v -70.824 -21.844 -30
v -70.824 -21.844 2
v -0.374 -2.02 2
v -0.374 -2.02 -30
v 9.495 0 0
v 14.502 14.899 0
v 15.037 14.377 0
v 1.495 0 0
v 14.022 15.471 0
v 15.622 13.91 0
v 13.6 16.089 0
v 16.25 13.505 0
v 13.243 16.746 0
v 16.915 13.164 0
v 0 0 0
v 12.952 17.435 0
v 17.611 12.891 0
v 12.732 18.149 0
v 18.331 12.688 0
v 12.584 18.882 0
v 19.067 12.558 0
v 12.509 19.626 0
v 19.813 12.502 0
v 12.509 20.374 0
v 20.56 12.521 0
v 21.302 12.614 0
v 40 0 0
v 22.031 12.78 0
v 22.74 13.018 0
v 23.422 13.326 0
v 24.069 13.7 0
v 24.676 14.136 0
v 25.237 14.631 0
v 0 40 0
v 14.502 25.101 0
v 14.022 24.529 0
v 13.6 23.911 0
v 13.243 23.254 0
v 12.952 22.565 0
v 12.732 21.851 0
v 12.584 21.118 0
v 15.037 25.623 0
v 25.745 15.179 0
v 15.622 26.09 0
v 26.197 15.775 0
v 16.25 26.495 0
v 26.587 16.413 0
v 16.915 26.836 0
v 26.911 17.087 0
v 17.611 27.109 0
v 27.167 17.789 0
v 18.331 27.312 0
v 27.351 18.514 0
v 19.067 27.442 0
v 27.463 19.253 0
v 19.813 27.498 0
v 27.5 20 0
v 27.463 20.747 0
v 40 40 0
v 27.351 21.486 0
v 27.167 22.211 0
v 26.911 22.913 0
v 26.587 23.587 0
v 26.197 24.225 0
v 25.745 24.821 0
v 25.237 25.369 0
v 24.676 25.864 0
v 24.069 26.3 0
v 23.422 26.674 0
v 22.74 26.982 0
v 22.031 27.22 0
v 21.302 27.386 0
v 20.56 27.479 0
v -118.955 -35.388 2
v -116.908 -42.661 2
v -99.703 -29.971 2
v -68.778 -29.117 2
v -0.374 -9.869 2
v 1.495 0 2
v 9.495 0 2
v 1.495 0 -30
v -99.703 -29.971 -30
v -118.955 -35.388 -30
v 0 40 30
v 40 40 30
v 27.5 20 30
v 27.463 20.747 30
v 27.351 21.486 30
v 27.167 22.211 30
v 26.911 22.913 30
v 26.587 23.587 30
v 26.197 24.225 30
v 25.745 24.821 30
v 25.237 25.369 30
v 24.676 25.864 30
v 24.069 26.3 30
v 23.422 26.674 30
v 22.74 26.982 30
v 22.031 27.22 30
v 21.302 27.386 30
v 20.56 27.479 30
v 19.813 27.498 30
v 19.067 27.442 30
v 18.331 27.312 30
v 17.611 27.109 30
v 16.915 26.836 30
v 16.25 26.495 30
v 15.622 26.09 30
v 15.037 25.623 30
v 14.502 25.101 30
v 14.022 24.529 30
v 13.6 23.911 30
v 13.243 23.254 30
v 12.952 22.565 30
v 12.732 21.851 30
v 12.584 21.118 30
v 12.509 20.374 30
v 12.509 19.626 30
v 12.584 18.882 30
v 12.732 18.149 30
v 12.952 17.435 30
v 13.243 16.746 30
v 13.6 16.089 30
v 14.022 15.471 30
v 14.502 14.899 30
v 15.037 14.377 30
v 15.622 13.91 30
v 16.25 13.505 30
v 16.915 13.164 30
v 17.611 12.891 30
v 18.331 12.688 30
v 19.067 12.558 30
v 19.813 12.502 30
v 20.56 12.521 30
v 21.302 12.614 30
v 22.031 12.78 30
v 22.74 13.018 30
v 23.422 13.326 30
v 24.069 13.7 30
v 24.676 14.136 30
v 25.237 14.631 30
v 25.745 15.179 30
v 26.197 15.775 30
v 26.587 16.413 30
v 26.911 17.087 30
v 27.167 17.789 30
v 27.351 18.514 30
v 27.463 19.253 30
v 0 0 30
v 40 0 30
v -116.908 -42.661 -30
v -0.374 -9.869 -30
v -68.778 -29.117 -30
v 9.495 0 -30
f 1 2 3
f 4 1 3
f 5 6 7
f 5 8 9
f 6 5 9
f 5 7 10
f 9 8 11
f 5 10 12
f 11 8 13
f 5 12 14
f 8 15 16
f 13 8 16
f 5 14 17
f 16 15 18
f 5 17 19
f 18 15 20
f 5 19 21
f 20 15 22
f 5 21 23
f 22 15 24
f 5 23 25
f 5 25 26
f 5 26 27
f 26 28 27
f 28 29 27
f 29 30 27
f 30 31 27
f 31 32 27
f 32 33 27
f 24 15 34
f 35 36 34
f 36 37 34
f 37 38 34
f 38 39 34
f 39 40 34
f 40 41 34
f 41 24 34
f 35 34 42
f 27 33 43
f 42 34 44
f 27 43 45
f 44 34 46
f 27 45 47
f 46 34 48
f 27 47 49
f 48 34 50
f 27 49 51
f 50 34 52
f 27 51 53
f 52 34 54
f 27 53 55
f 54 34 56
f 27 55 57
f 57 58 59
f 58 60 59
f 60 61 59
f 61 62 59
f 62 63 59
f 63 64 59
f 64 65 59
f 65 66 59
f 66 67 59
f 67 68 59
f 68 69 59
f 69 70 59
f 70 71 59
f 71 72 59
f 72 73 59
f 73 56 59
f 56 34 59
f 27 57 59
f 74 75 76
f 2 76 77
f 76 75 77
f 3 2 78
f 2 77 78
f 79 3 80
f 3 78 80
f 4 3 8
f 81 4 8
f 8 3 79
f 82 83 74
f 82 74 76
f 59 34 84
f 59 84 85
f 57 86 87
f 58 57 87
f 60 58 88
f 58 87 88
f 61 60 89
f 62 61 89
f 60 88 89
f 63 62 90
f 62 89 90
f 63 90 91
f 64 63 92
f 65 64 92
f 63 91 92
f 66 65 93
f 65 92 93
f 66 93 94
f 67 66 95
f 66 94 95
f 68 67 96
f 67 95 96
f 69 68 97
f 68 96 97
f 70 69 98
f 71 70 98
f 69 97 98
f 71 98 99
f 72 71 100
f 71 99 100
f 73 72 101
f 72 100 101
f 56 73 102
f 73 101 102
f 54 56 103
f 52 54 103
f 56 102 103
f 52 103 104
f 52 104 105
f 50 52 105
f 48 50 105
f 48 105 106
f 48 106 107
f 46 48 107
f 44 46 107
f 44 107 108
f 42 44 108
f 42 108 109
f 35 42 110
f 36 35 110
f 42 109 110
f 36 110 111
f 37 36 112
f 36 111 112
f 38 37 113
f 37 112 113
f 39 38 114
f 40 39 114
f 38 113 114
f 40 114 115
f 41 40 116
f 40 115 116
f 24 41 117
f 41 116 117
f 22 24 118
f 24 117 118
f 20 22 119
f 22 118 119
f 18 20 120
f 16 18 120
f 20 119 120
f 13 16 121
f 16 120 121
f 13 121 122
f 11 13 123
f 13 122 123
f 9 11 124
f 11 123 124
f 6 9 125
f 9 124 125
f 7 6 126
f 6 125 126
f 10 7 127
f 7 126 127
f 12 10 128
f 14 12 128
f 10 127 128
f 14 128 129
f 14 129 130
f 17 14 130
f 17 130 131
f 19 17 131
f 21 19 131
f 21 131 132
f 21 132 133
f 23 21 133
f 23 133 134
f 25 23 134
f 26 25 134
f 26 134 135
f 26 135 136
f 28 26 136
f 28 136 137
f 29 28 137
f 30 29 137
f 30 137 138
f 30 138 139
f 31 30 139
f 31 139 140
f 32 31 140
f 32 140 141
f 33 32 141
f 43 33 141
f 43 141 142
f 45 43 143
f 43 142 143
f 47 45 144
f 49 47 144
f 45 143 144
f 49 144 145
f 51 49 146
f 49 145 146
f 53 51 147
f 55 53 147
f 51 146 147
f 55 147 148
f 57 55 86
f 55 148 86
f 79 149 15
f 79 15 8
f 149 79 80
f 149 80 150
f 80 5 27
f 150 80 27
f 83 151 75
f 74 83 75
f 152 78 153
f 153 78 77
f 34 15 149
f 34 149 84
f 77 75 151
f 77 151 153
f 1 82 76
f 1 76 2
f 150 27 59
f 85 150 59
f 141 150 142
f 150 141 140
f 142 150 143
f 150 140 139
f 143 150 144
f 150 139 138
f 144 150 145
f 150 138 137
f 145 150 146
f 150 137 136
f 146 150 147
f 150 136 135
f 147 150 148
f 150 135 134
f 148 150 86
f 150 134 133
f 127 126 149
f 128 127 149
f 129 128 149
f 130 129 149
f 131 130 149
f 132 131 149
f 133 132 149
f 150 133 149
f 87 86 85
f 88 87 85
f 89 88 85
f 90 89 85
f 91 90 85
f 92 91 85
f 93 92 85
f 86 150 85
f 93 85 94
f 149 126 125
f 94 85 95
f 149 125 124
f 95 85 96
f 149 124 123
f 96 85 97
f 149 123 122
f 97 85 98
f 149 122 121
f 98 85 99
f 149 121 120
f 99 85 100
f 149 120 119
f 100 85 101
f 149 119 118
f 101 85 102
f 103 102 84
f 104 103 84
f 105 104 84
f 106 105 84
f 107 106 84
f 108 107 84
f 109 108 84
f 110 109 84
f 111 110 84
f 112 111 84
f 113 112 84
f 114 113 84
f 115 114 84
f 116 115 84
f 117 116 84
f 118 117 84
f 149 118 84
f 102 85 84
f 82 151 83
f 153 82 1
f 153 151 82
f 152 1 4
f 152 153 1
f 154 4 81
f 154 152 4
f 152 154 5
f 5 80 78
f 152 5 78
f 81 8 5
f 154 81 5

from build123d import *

# Parameters (mm, degrees)
CROQUIS1_W              = 40
CROQUIS1_H              = 40
SALIENTE_EXTRUIR1_DEPTH = 30
CROQUIS2_R              = 7.5
CORTAR_EXTRUIR1_DEPTH   = 30
SALIENTE_EXTRUIR2_DEPTH = 60
CORTAR_EXTRUIR2_DEPTH   = 28
CROQUIS5_W              = 30
CROQUIS5_H              = 32
SALIENTE_EXTRUIR3_DEPTH = 7.555544
CROQUIS6_W              = 20
CROQUIS6_H              = 32
SALIENTE_EXTRUIR4_DEPTH = 7.555546


with BuildPart() as part:
    # Croquis1 → Saliente-Extruir1 (new body)
    with BuildSketch(Plane.XY):
        with Locations((20, 20)):
            Rectangle(CROQUIS1_W, CROQUIS1_H)
    extrude(amount=SALIENTE_EXTRUIR1_DEPTH)

    # Croquis2 → Cortar-Extruir1 (cut)
    with BuildSketch(Plane.XY.offset(30)):
        with Locations((20, 20)):
            Circle(CROQUIS2_R)
    extrude(amount=-CORTAR_EXTRUIR1_DEPTH, mode=Mode.SUBTRACT)

    # Croquis3 → Saliente-Extruir2 (add)
    with BuildSketch(Plane.XY.offset(30)):
        Polygon((1.49506347, 0), (9.49506347, 0), (-0.374188302, -9.869251771), (-68.777675608, -29.117470727), (-70.824265709, -21.844387418), (-0.374188302, -2.020273637), align=None)
    extrude(amount=-SALIENTE_EXTRUIR2_DEPTH)

    # Croquis4 → Cortar-Extruir2 (cut)
    with BuildSketch(Plane.XY.offset(30)):
        Polygon((-70.824265709, -21.844387418), (-68.777675608, -29.117470727), (-0.374188302, -9.869251771), (9.49506347, 0), (1.49506347, 0), (-0.374188302, -2.020273637), align=None)
    extrude(amount=-CORTAR_EXTRUIR2_DEPTH, mode=Mode.SUBTRACT)

    # Croquis5 → Saliente-Extruir3 (add)
    with BuildSketch(Plane(origin=(2.545913561, -9.047557407, 0), x_dir=(0.9626152142655234, 0.2708725701589966, 0), z_dir=(0.2708725701589965, -0.9626152142655233, 0))):
        with Locations((-89.093561074, -14)):
            Rectangle(CROQUIS5_W, CROQUIS5_H)
    extrude(amount=-SALIENTE_EXTRUIR3_DEPTH)

    # Croquis6 → Saliente-Extruir4 (add)
    with BuildSketch(Plane(origin=(2.545913561, -9.047557407, 0), x_dir=(0.9626152142655234, 0.2708725701589966, 0), z_dir=(0.2708725701589965, -0.9626152142655233, 0))):
        with Locations((-114.093561074, -14)):
            Rectangle(CROQUIS6_W, CROQUIS6_H)
    extrude(amount=-SALIENTE_EXTRUIR4_DEPTH)


solid = part.part
